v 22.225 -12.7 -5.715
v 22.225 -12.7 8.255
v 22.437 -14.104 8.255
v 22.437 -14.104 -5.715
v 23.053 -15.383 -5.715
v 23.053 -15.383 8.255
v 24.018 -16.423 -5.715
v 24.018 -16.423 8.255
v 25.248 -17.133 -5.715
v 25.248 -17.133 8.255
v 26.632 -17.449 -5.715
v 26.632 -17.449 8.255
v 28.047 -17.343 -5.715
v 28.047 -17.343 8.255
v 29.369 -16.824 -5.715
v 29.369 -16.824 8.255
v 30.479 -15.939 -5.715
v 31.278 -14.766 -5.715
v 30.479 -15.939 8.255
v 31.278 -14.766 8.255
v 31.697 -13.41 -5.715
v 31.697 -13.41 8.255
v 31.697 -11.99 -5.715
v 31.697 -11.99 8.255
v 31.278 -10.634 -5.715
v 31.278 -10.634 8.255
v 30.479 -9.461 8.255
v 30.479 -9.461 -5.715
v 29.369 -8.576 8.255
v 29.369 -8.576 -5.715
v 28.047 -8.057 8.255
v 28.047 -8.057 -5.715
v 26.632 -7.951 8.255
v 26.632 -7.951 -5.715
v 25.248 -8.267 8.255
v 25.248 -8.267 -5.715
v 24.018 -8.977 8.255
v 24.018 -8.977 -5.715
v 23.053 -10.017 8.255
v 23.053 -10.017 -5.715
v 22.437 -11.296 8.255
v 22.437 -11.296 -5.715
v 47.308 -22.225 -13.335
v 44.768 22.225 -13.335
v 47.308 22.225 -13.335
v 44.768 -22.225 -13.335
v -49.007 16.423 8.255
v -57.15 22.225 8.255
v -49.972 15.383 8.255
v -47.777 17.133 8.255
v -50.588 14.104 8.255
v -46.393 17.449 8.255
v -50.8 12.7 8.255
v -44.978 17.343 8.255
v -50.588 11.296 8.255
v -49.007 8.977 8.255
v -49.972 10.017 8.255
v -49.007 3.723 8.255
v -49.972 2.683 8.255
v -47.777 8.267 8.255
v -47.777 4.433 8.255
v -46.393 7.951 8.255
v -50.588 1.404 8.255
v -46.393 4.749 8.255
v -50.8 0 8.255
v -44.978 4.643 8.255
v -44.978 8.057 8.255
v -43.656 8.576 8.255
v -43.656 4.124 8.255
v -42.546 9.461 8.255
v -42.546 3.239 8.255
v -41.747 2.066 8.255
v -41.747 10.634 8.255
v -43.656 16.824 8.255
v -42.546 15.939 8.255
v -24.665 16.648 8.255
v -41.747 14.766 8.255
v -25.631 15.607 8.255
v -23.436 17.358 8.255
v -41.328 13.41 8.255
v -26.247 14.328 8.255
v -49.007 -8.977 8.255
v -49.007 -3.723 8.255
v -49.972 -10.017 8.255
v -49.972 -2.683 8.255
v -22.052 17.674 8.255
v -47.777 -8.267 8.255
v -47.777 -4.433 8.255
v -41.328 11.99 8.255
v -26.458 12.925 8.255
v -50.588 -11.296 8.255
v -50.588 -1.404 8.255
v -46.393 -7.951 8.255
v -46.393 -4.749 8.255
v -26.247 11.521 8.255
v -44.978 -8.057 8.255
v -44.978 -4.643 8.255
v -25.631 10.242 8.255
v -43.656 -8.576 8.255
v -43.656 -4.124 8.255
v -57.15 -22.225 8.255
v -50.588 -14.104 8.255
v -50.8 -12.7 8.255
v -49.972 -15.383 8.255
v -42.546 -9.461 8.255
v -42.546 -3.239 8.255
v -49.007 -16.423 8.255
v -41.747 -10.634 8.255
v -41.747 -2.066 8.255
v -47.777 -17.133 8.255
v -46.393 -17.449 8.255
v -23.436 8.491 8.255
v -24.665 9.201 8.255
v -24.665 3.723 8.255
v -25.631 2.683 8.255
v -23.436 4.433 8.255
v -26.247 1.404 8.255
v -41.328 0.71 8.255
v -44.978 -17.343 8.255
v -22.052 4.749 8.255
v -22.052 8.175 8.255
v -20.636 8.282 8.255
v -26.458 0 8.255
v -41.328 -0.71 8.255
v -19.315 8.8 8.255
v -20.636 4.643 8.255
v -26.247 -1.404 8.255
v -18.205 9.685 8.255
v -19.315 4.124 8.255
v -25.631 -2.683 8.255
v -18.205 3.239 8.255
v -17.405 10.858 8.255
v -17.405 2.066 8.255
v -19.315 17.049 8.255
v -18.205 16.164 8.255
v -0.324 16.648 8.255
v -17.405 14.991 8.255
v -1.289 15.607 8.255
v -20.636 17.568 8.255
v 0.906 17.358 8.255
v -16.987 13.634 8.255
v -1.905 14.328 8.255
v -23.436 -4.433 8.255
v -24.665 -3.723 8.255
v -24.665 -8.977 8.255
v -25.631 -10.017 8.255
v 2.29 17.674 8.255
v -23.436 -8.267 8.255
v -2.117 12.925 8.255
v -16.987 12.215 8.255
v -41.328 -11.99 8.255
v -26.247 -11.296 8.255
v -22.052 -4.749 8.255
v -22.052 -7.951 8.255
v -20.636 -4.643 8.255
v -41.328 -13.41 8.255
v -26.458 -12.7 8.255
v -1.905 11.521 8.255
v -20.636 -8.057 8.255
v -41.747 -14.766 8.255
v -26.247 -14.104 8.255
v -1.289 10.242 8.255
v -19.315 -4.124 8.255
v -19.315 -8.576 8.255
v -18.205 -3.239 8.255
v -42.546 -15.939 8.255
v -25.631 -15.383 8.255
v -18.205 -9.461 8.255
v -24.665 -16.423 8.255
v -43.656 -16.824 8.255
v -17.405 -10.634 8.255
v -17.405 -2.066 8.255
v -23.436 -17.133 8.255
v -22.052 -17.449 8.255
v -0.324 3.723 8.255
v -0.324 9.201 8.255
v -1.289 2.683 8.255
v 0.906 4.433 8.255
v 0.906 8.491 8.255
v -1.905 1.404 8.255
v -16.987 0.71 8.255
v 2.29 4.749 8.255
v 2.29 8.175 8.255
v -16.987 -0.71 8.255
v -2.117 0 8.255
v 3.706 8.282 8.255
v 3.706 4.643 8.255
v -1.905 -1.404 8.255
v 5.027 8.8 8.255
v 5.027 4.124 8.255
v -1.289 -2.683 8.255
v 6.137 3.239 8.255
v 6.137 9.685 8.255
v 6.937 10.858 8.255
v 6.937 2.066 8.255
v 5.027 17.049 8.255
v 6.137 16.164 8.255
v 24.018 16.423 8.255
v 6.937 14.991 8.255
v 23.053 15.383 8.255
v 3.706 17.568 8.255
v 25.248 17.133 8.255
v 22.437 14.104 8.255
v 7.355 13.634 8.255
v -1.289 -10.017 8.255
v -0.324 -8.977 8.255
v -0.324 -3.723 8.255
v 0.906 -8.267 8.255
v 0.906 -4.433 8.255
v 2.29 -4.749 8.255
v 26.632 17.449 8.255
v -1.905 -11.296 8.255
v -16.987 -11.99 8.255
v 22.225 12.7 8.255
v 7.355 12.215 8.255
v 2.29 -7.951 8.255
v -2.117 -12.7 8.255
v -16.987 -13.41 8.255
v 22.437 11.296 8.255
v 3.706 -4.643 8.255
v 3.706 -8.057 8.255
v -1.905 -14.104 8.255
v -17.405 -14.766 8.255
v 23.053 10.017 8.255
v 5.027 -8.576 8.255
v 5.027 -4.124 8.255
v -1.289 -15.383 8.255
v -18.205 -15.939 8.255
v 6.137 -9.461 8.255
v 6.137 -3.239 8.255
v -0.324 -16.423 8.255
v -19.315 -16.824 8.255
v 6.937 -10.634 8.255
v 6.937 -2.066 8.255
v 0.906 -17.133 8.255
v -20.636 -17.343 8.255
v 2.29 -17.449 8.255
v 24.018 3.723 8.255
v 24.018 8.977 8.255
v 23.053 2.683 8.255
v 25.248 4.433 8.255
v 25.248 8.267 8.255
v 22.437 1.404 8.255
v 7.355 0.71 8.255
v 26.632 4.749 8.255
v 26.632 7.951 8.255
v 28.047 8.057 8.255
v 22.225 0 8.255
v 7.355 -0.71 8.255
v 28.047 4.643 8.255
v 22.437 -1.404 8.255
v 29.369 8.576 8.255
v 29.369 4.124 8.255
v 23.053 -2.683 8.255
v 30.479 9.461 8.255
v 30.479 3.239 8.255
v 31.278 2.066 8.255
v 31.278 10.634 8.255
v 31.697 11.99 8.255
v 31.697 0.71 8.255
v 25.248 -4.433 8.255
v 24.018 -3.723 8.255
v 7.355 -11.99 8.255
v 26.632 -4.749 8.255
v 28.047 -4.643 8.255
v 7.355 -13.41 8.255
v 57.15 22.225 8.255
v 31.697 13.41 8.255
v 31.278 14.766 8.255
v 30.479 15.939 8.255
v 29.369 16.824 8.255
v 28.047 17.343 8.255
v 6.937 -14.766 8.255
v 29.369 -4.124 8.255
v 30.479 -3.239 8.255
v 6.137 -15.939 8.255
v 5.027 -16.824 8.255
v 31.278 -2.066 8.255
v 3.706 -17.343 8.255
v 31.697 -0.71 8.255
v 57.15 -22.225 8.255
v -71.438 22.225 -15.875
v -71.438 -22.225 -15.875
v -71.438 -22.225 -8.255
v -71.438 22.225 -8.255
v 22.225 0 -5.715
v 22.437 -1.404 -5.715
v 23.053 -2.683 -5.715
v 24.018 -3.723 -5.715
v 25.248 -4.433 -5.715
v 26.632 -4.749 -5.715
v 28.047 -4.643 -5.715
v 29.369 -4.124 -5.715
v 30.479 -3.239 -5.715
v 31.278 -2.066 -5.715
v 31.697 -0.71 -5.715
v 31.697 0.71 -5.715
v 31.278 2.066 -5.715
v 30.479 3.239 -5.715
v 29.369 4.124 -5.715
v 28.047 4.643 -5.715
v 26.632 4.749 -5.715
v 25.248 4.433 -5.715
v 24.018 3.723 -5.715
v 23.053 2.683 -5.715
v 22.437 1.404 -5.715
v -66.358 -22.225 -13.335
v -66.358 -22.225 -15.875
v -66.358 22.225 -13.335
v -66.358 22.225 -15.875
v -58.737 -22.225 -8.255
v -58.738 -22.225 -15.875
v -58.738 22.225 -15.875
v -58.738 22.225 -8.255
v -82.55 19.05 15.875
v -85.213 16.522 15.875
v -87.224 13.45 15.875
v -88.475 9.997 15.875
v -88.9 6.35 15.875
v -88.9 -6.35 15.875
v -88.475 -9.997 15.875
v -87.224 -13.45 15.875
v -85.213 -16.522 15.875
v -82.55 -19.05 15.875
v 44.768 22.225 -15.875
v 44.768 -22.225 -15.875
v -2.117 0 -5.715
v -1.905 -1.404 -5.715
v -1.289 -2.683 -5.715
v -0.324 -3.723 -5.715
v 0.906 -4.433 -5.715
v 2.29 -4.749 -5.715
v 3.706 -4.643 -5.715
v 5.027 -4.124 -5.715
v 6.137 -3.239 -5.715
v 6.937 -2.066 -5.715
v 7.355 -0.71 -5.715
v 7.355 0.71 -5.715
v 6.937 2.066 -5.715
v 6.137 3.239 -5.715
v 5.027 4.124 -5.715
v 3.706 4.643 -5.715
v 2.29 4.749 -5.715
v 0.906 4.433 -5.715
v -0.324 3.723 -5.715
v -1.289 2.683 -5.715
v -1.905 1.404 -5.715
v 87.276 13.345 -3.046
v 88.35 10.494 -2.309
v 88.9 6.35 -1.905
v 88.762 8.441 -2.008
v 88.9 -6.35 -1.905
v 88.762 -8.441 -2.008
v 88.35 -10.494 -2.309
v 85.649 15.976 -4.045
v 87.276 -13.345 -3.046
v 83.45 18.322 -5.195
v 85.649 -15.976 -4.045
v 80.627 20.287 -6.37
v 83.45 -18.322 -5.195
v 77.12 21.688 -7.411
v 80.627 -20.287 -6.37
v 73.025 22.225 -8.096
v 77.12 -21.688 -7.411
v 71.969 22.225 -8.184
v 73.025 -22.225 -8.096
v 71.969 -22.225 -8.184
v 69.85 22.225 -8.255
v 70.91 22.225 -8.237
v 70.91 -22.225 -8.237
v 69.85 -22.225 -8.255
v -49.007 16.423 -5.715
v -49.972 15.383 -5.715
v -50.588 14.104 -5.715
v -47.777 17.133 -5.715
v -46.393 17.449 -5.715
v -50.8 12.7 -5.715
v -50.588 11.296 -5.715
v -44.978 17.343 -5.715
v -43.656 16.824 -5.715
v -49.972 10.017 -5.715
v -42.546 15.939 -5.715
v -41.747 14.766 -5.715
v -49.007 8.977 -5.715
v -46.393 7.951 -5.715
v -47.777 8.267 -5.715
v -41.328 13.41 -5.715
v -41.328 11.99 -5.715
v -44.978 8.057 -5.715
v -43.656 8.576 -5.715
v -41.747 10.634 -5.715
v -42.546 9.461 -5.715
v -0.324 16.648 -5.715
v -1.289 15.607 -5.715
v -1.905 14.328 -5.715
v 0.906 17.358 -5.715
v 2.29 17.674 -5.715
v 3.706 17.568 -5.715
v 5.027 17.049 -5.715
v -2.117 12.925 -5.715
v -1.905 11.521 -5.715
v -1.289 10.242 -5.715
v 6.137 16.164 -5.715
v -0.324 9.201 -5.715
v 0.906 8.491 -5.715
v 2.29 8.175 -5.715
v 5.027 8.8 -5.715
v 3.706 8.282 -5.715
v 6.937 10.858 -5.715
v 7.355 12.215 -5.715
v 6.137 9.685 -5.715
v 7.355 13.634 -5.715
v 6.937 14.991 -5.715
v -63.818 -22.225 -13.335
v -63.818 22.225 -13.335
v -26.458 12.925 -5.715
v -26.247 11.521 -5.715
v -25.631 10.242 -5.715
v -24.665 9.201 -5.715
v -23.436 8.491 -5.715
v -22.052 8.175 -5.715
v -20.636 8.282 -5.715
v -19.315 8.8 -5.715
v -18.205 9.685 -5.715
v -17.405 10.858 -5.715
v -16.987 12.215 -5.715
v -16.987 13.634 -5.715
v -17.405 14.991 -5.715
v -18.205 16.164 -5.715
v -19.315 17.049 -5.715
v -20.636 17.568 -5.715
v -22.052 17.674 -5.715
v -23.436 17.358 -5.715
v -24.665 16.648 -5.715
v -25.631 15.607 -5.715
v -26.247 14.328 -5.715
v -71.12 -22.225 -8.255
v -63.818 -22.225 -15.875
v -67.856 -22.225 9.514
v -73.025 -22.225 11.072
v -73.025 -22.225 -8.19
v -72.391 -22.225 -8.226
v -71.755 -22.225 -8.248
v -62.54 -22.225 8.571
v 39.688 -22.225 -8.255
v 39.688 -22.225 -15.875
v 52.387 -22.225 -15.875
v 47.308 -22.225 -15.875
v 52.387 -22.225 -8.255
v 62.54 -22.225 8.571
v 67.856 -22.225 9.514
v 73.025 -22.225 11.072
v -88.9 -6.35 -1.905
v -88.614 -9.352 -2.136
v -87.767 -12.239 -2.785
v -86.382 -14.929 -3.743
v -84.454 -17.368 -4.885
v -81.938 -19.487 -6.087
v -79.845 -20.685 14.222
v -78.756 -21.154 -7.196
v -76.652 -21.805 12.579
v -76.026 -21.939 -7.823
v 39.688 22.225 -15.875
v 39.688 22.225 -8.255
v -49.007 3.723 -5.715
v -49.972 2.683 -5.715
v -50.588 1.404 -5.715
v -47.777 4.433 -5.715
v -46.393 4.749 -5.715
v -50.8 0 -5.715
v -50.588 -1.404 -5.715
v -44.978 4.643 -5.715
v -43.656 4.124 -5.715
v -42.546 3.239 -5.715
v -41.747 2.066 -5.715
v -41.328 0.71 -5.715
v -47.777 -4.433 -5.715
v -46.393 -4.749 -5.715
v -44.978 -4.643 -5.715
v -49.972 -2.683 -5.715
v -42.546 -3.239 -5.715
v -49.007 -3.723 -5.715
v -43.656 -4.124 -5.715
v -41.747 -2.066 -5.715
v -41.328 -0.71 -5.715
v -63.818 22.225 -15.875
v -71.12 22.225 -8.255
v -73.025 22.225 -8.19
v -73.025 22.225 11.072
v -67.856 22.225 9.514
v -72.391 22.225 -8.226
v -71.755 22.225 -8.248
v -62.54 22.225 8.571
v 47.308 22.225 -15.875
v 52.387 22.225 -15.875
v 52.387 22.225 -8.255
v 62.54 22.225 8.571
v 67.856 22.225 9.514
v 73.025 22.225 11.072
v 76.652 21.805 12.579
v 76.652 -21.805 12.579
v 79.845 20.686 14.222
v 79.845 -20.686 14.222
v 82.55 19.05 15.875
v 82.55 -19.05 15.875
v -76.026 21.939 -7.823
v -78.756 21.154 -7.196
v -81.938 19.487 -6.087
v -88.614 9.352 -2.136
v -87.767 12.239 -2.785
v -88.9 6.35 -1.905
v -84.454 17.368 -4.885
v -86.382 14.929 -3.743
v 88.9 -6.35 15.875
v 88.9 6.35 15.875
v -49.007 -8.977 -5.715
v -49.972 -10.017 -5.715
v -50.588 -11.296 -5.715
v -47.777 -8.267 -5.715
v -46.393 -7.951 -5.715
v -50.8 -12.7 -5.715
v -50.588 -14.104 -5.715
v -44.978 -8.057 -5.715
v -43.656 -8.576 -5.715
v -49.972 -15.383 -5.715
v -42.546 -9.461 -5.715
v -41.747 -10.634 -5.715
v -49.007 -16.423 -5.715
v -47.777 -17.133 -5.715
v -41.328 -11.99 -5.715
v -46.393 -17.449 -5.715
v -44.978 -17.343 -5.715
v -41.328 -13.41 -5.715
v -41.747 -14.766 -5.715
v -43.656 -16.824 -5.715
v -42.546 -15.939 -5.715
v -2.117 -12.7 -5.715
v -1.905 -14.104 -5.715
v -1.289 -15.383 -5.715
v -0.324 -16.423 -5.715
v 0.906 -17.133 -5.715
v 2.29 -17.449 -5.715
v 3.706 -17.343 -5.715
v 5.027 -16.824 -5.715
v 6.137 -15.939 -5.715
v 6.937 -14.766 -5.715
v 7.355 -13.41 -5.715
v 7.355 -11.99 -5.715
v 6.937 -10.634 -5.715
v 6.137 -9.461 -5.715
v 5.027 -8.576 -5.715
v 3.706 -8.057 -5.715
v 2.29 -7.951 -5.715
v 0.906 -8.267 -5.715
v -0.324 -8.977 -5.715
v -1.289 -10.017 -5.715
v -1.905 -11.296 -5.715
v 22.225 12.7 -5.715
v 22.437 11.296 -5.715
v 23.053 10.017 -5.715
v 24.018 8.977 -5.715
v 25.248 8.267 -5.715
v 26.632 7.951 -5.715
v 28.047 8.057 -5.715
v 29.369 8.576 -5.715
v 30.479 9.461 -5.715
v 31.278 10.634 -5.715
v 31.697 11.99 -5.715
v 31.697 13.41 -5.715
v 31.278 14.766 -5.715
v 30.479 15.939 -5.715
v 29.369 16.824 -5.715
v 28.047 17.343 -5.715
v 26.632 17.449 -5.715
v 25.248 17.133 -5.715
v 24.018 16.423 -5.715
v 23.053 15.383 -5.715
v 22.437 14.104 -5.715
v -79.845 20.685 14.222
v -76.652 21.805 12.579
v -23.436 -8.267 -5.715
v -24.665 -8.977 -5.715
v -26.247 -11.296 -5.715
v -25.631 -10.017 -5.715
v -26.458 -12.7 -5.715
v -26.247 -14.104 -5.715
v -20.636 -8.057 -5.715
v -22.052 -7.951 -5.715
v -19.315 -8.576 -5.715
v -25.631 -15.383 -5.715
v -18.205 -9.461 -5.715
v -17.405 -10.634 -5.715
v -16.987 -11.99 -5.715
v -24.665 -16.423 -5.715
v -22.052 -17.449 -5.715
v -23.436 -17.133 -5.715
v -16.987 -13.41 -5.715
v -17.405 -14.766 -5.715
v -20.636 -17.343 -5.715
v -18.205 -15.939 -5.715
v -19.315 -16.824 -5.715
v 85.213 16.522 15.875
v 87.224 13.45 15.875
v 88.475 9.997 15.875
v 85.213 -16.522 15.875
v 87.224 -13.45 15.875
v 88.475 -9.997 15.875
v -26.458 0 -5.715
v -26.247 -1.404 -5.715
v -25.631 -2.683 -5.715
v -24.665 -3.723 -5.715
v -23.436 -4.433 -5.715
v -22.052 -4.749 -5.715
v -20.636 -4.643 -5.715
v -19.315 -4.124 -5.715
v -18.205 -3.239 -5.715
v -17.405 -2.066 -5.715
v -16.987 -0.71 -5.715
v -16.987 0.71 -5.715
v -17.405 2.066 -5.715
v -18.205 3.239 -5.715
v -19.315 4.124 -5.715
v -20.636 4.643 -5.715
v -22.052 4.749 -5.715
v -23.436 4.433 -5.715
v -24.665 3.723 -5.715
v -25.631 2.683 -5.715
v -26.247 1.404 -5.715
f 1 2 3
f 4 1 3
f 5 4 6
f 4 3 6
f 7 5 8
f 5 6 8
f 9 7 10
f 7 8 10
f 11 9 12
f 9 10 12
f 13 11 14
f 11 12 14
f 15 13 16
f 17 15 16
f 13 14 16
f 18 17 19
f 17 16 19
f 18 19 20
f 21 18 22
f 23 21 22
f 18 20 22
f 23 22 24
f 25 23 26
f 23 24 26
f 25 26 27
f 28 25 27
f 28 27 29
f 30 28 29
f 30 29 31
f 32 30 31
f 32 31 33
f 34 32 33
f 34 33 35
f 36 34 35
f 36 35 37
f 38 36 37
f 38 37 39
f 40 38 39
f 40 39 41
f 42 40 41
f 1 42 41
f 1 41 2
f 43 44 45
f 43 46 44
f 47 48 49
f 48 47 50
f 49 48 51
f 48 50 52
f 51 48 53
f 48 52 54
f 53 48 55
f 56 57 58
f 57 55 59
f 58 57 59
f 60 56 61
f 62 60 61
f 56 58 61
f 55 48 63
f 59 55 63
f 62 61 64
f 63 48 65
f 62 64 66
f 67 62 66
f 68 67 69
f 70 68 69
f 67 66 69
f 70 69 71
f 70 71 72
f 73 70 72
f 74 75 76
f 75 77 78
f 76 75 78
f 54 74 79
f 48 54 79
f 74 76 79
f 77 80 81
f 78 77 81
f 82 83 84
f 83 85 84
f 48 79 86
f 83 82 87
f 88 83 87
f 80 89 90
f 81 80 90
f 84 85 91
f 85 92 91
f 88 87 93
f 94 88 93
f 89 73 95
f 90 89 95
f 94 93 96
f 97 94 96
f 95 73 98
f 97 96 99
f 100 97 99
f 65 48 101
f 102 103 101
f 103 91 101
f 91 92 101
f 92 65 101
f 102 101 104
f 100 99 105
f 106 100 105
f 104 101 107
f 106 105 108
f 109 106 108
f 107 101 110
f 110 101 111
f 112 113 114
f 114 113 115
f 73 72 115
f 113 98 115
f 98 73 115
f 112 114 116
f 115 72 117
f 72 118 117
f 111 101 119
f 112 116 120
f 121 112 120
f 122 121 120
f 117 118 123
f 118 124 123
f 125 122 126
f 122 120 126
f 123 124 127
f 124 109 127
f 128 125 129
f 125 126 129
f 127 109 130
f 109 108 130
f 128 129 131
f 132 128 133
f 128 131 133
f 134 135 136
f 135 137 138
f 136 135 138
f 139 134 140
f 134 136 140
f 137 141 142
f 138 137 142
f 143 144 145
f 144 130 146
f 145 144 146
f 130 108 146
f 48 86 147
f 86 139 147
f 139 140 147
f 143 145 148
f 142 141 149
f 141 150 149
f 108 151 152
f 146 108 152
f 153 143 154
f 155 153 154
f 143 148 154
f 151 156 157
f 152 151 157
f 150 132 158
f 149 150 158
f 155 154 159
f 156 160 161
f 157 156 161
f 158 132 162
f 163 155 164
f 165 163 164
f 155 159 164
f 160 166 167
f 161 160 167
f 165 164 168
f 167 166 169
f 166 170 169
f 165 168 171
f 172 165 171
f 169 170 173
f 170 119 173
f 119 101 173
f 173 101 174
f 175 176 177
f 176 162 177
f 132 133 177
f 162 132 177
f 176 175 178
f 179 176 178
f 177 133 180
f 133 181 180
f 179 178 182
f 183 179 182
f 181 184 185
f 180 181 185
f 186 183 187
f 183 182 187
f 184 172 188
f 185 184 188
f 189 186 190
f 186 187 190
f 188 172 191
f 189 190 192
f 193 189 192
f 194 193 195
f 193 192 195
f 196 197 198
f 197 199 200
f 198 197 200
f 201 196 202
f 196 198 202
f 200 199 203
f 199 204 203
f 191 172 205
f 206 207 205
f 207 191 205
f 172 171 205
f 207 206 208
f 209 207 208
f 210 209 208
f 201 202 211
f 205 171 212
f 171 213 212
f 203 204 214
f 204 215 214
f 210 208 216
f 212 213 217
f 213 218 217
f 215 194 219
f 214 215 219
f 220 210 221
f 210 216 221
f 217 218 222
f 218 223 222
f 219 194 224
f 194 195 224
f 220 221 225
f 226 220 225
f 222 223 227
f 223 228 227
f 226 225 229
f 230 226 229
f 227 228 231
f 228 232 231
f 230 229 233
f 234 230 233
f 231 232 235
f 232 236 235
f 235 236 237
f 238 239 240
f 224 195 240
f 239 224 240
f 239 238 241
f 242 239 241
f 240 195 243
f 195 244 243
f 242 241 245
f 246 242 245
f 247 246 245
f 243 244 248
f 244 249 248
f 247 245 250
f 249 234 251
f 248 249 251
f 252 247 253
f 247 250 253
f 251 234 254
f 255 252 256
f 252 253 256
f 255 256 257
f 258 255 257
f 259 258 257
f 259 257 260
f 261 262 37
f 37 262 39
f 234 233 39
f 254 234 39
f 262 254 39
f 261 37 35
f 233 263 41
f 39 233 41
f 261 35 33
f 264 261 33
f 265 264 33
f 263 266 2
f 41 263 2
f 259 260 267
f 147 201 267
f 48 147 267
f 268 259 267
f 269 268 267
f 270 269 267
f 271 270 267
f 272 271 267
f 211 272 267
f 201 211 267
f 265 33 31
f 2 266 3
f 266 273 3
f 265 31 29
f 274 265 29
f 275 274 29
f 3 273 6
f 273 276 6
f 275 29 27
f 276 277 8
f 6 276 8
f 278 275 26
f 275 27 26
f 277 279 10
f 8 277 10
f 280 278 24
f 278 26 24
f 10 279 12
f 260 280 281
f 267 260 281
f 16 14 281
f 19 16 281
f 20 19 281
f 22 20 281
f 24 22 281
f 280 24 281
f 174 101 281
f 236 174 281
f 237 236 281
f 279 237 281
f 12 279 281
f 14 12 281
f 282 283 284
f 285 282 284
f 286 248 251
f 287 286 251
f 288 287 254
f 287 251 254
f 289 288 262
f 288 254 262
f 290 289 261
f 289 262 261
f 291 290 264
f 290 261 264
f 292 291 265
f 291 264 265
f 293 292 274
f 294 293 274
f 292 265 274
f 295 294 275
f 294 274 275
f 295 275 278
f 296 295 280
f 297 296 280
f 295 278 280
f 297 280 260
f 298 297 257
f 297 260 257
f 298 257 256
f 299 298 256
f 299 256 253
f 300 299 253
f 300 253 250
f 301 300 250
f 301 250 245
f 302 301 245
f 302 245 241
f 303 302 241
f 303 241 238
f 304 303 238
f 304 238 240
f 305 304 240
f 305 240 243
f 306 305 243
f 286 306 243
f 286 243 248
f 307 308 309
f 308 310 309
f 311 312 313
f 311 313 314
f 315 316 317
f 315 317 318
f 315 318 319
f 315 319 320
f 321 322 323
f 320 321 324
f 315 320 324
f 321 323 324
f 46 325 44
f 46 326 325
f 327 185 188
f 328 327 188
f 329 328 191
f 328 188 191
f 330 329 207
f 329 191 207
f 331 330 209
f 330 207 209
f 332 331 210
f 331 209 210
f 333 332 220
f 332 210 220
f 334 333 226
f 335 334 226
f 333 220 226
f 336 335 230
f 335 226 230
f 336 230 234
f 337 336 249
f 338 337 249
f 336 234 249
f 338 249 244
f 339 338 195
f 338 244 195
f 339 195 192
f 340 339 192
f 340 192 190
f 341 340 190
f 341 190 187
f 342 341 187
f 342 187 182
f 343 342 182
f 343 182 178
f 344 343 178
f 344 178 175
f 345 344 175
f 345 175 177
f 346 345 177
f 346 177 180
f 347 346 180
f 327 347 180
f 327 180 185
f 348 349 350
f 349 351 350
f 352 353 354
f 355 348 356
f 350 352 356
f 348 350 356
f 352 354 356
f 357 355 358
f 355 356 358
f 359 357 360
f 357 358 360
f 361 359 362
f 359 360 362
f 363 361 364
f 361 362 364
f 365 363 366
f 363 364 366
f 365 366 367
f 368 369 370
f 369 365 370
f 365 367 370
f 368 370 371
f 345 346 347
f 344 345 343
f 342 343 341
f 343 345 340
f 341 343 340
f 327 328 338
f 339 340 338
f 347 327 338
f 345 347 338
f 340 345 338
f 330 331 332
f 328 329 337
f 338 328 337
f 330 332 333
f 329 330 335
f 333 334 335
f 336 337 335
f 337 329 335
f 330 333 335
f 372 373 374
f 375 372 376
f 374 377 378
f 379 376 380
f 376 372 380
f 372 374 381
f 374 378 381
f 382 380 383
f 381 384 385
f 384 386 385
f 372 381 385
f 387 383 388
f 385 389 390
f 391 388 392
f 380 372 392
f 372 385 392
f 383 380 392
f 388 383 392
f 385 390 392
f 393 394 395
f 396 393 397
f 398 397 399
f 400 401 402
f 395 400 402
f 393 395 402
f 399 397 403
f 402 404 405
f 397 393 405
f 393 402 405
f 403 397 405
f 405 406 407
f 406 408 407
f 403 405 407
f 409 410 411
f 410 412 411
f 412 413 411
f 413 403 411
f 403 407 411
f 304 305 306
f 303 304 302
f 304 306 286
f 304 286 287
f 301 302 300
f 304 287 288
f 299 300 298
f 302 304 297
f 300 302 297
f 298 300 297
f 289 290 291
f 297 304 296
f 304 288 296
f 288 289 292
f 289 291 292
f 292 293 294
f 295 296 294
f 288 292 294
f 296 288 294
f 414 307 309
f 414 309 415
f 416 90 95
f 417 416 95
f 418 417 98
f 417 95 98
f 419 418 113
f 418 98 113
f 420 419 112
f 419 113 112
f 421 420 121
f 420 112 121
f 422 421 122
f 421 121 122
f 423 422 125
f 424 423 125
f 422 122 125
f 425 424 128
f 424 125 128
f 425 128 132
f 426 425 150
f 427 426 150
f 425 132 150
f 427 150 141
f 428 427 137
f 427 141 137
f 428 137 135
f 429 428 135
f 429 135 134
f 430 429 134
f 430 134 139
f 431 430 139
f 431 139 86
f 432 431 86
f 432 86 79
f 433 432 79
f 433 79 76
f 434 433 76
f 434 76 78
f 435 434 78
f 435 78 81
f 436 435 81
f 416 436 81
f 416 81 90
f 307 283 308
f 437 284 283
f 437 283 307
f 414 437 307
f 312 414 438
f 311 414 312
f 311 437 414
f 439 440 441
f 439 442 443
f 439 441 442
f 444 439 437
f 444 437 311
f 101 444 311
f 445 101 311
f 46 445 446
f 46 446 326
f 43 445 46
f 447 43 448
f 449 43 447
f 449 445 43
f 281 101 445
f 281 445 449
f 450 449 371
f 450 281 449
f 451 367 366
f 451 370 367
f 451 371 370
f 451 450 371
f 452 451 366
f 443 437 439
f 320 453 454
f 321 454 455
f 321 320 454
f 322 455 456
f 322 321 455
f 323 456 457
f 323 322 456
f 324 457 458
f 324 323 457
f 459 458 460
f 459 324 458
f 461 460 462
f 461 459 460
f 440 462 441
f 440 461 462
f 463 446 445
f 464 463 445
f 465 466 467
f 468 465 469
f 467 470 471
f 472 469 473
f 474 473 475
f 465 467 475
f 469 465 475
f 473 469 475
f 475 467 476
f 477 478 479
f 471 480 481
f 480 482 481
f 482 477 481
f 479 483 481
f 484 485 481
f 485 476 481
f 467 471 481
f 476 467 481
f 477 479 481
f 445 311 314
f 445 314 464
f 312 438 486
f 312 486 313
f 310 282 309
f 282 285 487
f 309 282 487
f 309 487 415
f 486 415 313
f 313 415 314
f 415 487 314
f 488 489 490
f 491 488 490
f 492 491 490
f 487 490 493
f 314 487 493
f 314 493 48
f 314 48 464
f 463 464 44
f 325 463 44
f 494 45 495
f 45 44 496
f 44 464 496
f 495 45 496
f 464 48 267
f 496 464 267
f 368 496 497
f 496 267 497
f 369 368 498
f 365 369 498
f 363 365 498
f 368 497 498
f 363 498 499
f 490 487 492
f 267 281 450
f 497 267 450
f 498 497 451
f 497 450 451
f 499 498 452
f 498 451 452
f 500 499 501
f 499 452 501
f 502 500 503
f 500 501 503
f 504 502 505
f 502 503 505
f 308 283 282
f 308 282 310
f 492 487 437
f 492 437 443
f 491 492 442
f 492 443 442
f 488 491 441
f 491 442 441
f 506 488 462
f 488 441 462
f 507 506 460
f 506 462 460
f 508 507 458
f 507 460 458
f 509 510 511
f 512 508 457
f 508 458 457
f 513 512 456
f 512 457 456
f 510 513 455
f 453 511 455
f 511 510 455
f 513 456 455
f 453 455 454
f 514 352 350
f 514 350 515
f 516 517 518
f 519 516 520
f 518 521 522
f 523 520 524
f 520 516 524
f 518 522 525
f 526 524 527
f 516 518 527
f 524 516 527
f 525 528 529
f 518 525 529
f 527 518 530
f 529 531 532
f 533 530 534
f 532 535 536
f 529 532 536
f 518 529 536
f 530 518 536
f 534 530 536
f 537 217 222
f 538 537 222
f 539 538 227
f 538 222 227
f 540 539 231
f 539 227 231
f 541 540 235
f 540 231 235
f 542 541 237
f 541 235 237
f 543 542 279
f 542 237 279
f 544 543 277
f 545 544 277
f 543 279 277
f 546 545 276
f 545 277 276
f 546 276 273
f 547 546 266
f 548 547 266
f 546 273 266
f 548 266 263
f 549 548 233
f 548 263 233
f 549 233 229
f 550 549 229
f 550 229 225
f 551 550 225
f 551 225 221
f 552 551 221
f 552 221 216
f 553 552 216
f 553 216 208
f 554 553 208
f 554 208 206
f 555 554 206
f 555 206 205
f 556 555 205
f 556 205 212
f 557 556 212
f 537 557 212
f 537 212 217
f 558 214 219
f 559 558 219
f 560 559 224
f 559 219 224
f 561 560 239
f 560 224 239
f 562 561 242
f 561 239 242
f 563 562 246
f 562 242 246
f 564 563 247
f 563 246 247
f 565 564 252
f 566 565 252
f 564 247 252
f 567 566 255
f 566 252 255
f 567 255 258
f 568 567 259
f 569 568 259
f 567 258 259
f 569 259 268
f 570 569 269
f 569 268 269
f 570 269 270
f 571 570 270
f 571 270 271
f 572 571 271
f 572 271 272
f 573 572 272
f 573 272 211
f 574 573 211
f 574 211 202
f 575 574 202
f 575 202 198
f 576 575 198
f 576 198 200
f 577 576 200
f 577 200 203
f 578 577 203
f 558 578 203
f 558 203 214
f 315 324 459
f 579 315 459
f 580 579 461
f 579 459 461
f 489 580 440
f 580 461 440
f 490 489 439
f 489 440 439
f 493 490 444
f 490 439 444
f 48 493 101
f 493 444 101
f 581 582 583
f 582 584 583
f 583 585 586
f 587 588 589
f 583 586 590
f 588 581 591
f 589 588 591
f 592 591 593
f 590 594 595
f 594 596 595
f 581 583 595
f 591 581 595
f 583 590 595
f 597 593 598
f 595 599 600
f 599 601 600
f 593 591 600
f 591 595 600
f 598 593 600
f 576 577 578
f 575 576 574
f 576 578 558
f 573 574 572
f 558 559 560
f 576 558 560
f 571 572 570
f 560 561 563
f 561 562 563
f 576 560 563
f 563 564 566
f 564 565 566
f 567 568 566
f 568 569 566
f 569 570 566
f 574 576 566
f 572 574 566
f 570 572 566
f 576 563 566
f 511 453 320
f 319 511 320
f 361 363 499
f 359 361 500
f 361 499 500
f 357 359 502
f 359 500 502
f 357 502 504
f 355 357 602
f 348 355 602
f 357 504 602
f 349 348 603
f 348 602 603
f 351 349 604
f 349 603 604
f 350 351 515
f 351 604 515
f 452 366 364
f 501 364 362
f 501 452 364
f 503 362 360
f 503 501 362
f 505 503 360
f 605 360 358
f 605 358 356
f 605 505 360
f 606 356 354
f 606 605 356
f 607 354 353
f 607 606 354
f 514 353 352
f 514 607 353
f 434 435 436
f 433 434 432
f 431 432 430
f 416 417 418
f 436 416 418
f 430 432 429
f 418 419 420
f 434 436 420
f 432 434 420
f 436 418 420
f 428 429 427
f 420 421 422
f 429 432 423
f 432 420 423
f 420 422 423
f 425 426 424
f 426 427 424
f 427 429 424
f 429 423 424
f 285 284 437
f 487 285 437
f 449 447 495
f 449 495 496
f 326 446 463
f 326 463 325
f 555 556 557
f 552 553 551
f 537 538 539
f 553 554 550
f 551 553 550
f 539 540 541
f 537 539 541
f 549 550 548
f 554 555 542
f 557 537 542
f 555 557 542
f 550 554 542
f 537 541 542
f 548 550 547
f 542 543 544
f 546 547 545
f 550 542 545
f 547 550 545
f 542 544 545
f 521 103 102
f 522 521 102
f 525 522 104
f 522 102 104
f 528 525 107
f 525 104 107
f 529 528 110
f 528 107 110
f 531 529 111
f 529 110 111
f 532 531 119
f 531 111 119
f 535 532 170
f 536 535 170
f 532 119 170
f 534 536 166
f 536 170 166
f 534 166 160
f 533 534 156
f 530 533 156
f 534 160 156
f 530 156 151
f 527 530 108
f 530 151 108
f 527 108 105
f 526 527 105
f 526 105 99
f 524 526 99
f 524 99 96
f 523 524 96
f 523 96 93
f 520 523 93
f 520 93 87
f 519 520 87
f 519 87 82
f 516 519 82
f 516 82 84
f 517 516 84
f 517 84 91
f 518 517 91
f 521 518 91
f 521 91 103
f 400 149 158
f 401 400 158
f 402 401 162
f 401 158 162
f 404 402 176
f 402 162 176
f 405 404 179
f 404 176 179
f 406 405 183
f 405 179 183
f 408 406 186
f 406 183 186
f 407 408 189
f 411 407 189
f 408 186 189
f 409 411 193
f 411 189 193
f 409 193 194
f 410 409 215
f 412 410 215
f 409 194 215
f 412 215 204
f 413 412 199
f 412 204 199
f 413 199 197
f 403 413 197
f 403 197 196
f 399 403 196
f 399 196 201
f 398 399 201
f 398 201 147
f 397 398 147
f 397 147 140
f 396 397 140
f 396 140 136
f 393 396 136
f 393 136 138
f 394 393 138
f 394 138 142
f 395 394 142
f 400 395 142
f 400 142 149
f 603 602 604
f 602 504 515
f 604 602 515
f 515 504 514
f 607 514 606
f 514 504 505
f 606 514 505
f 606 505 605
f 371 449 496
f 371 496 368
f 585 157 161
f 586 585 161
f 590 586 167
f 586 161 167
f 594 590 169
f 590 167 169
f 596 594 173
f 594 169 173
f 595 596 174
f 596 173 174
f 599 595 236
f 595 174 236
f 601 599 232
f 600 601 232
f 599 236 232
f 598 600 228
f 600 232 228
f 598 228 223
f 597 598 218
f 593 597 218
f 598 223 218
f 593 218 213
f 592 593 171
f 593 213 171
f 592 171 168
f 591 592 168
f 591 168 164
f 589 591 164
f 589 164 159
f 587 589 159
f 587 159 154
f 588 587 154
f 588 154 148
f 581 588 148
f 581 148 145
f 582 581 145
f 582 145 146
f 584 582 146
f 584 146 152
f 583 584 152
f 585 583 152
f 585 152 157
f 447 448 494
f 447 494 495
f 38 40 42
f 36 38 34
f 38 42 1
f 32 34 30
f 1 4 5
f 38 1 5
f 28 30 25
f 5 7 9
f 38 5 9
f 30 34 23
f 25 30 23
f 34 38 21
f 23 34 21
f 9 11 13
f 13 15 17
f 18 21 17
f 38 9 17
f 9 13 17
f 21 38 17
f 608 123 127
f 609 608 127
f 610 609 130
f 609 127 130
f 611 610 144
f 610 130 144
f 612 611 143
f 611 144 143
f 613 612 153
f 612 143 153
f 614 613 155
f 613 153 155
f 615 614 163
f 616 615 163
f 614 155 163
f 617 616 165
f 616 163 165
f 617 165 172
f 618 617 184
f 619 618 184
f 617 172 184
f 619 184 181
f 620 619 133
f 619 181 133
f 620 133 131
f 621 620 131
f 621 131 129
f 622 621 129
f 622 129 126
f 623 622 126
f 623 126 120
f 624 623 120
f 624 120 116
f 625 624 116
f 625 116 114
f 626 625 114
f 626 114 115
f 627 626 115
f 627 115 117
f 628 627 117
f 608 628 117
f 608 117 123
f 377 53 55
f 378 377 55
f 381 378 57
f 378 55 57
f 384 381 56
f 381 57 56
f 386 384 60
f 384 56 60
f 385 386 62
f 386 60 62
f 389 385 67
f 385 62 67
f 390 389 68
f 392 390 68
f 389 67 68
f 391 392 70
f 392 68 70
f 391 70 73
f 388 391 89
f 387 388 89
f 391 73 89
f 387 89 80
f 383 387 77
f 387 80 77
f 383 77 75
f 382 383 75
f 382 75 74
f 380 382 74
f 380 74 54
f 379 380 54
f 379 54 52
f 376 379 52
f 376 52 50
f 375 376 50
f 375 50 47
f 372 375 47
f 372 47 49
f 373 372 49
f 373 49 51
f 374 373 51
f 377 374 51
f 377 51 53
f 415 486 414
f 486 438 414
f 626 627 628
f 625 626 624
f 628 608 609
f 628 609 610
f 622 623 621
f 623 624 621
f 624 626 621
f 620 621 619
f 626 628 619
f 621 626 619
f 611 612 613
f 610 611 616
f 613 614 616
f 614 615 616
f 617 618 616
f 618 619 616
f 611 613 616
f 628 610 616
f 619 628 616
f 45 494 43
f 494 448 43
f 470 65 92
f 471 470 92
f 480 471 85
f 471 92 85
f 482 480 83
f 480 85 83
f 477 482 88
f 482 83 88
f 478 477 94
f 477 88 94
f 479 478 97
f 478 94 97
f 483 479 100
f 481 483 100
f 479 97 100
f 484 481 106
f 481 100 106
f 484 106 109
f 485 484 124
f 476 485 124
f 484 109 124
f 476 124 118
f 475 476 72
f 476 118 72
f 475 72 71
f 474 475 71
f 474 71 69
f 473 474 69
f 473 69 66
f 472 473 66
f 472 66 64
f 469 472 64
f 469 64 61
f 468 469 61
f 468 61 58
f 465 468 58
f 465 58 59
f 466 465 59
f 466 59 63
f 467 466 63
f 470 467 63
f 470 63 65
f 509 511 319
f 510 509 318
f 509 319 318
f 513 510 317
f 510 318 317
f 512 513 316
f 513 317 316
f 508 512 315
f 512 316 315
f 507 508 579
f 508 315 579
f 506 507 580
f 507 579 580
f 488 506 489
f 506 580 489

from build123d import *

# Parameters (mm, degrees)
F0_W          = 177.8
F0_H          = 31.75
F12_DEPTH     = 22.225
F1_W          = 2.54
F1_H          = 2.54
F2_DEPTH      = 22.225
F2_DEPTH_BACK = 22.225
F3_W          = 17.4625
F3_H          = 7.62
F3_W_2        = 98.425
F3_W_3        = 36.5125
F4_DEPTH      = 44.451
F6_DEPTH      = 44.451
F7_R          = 15.875
F9_D          = 9.525
F10_W         = 98.425
F10_H         = 44.45
F11_DEPTH     = 2.54


# Not quite as in the source:
# - a length typed as a fraction of an inch, garbled in the dataset ("3 / 203.2 mm" for 3/8 in), is restored


with BuildPart() as f12:
    # F0 (on Front) → F12 (new body, symmetric)
    with BuildSketch(Plane.XZ):
        Rectangle(F0_W, F0_H)
    extrude(amount=F12_DEPTH, both=True)

    # F1 (on Front) → F2 (cut, two sides)
    with BuildSketch(Plane.XZ) as f2_sk:
        with Locations((-65.0875, -14.605)):
            Rectangle(F1_W, F1_H)
        with Locations((46.0375, -14.605)):
            Rectangle(F1_W, F1_H)
    extrude(amount=F2_DEPTH, mode=Mode.SUBTRACT)
    extrude(f2_sk.sketch, amount=-F2_DEPTH_BACK, mode=Mode.SUBTRACT)

    # F3 (on face) → F4 (cut, through all)
    with BuildSketch(Plane.XZ.offset(22.225)):
        with Locations((-80.16875, -12.065)):
            Rectangle(F3_W, F3_H)
        with Locations((-9.525, -12.065)):
            Rectangle(F3_W_2, F3_H)
        with Locations((70.64375, -12.065)):
            Rectangle(F3_W_3, F3_H)
    extrude(amount=-F4_DEPTH, mode=Mode.SUBTRACT)

    # F5 (on face) → F6 (cut, through all)
    with BuildSketch(Plane.XZ.offset(22.225)):
        with BuildLine():
            Line((82.55, 15.875), (-82.55, 15.875))
            ThreePointArc((-82.55, 15.875), (-70.4091892663, 10.2010357789), (-57.15, 8.255))
            Line((-57.15, 8.255), (57.15, 8.255))
            ThreePointArc((57.15, 8.255), (70.4091892663, 10.2010357789), (82.55, 15.875))
        make_face()
        with BuildLine():
            ThreePointArc((-71.12, -8.255), (-80.5599536545, -6.6198702327), (-88.9, -1.905))
            Line((-88.9, -1.905), (-88.9, -8.255))
            Line((-88.9, -8.255), (-71.4375, -8.255))
            Line((-71.4375, -8.255), (-71.12, -8.255))
        make_face()
        with BuildLine():
            Line((88.9, -8.255), (88.9, -1.905))
            ThreePointArc((88.9, -1.905), (79.890231571, -6.6256947131), (69.85, -8.255))
            Line((69.85, -8.255), (88.9, -8.255))
        make_face()
    extrude(amount=-F6_DEPTH, mode=Mode.SUBTRACT)

    # F7
    f7_edges = [f12.edges().sort_by_distance(p)[0] for p in [
        (-88.9, -22.225, 6.985),
        (88.9, -22.225, 6.985),
        (88.9, 22.225, 6.985),
        (-88.9, 22.225, 6.985),
    ]]
    fillet(f7_edges, radius=F7_R)

    # F9 (through all)
    with Locations(Plane(origin=(0, 0, -8.255), x_dir=(1, 0, 0), z_dir=(0, 0, -1))):
        with Locations((-46.0375, 12.7), (-46.0375, 0), (-46.0375, -12.7), (26.9875, -12.7), (26.9875, 0), (26.9875, 12.7), (-21.6958333333, 12.7), (2.6458333333, 12.7), (2.6458333333, 0), (-21.6958333333, 0), (-21.6958333333, -12.924679948), (2.6458333333, -12.924679948)):
            Hole(F9_D / 2)

    # F10 (on face) → F11 (join)
    with BuildSketch(Plane(origin=(0, 0, -8.255), x_dir=(1, 0, 0), z_dir=(0, 0, -1))):
        with Locations((-9.525, 0)):
            Rectangle(F10_W, F10_H)
    extrude(amount=-F11_DEPTH)


solid = f12.part
